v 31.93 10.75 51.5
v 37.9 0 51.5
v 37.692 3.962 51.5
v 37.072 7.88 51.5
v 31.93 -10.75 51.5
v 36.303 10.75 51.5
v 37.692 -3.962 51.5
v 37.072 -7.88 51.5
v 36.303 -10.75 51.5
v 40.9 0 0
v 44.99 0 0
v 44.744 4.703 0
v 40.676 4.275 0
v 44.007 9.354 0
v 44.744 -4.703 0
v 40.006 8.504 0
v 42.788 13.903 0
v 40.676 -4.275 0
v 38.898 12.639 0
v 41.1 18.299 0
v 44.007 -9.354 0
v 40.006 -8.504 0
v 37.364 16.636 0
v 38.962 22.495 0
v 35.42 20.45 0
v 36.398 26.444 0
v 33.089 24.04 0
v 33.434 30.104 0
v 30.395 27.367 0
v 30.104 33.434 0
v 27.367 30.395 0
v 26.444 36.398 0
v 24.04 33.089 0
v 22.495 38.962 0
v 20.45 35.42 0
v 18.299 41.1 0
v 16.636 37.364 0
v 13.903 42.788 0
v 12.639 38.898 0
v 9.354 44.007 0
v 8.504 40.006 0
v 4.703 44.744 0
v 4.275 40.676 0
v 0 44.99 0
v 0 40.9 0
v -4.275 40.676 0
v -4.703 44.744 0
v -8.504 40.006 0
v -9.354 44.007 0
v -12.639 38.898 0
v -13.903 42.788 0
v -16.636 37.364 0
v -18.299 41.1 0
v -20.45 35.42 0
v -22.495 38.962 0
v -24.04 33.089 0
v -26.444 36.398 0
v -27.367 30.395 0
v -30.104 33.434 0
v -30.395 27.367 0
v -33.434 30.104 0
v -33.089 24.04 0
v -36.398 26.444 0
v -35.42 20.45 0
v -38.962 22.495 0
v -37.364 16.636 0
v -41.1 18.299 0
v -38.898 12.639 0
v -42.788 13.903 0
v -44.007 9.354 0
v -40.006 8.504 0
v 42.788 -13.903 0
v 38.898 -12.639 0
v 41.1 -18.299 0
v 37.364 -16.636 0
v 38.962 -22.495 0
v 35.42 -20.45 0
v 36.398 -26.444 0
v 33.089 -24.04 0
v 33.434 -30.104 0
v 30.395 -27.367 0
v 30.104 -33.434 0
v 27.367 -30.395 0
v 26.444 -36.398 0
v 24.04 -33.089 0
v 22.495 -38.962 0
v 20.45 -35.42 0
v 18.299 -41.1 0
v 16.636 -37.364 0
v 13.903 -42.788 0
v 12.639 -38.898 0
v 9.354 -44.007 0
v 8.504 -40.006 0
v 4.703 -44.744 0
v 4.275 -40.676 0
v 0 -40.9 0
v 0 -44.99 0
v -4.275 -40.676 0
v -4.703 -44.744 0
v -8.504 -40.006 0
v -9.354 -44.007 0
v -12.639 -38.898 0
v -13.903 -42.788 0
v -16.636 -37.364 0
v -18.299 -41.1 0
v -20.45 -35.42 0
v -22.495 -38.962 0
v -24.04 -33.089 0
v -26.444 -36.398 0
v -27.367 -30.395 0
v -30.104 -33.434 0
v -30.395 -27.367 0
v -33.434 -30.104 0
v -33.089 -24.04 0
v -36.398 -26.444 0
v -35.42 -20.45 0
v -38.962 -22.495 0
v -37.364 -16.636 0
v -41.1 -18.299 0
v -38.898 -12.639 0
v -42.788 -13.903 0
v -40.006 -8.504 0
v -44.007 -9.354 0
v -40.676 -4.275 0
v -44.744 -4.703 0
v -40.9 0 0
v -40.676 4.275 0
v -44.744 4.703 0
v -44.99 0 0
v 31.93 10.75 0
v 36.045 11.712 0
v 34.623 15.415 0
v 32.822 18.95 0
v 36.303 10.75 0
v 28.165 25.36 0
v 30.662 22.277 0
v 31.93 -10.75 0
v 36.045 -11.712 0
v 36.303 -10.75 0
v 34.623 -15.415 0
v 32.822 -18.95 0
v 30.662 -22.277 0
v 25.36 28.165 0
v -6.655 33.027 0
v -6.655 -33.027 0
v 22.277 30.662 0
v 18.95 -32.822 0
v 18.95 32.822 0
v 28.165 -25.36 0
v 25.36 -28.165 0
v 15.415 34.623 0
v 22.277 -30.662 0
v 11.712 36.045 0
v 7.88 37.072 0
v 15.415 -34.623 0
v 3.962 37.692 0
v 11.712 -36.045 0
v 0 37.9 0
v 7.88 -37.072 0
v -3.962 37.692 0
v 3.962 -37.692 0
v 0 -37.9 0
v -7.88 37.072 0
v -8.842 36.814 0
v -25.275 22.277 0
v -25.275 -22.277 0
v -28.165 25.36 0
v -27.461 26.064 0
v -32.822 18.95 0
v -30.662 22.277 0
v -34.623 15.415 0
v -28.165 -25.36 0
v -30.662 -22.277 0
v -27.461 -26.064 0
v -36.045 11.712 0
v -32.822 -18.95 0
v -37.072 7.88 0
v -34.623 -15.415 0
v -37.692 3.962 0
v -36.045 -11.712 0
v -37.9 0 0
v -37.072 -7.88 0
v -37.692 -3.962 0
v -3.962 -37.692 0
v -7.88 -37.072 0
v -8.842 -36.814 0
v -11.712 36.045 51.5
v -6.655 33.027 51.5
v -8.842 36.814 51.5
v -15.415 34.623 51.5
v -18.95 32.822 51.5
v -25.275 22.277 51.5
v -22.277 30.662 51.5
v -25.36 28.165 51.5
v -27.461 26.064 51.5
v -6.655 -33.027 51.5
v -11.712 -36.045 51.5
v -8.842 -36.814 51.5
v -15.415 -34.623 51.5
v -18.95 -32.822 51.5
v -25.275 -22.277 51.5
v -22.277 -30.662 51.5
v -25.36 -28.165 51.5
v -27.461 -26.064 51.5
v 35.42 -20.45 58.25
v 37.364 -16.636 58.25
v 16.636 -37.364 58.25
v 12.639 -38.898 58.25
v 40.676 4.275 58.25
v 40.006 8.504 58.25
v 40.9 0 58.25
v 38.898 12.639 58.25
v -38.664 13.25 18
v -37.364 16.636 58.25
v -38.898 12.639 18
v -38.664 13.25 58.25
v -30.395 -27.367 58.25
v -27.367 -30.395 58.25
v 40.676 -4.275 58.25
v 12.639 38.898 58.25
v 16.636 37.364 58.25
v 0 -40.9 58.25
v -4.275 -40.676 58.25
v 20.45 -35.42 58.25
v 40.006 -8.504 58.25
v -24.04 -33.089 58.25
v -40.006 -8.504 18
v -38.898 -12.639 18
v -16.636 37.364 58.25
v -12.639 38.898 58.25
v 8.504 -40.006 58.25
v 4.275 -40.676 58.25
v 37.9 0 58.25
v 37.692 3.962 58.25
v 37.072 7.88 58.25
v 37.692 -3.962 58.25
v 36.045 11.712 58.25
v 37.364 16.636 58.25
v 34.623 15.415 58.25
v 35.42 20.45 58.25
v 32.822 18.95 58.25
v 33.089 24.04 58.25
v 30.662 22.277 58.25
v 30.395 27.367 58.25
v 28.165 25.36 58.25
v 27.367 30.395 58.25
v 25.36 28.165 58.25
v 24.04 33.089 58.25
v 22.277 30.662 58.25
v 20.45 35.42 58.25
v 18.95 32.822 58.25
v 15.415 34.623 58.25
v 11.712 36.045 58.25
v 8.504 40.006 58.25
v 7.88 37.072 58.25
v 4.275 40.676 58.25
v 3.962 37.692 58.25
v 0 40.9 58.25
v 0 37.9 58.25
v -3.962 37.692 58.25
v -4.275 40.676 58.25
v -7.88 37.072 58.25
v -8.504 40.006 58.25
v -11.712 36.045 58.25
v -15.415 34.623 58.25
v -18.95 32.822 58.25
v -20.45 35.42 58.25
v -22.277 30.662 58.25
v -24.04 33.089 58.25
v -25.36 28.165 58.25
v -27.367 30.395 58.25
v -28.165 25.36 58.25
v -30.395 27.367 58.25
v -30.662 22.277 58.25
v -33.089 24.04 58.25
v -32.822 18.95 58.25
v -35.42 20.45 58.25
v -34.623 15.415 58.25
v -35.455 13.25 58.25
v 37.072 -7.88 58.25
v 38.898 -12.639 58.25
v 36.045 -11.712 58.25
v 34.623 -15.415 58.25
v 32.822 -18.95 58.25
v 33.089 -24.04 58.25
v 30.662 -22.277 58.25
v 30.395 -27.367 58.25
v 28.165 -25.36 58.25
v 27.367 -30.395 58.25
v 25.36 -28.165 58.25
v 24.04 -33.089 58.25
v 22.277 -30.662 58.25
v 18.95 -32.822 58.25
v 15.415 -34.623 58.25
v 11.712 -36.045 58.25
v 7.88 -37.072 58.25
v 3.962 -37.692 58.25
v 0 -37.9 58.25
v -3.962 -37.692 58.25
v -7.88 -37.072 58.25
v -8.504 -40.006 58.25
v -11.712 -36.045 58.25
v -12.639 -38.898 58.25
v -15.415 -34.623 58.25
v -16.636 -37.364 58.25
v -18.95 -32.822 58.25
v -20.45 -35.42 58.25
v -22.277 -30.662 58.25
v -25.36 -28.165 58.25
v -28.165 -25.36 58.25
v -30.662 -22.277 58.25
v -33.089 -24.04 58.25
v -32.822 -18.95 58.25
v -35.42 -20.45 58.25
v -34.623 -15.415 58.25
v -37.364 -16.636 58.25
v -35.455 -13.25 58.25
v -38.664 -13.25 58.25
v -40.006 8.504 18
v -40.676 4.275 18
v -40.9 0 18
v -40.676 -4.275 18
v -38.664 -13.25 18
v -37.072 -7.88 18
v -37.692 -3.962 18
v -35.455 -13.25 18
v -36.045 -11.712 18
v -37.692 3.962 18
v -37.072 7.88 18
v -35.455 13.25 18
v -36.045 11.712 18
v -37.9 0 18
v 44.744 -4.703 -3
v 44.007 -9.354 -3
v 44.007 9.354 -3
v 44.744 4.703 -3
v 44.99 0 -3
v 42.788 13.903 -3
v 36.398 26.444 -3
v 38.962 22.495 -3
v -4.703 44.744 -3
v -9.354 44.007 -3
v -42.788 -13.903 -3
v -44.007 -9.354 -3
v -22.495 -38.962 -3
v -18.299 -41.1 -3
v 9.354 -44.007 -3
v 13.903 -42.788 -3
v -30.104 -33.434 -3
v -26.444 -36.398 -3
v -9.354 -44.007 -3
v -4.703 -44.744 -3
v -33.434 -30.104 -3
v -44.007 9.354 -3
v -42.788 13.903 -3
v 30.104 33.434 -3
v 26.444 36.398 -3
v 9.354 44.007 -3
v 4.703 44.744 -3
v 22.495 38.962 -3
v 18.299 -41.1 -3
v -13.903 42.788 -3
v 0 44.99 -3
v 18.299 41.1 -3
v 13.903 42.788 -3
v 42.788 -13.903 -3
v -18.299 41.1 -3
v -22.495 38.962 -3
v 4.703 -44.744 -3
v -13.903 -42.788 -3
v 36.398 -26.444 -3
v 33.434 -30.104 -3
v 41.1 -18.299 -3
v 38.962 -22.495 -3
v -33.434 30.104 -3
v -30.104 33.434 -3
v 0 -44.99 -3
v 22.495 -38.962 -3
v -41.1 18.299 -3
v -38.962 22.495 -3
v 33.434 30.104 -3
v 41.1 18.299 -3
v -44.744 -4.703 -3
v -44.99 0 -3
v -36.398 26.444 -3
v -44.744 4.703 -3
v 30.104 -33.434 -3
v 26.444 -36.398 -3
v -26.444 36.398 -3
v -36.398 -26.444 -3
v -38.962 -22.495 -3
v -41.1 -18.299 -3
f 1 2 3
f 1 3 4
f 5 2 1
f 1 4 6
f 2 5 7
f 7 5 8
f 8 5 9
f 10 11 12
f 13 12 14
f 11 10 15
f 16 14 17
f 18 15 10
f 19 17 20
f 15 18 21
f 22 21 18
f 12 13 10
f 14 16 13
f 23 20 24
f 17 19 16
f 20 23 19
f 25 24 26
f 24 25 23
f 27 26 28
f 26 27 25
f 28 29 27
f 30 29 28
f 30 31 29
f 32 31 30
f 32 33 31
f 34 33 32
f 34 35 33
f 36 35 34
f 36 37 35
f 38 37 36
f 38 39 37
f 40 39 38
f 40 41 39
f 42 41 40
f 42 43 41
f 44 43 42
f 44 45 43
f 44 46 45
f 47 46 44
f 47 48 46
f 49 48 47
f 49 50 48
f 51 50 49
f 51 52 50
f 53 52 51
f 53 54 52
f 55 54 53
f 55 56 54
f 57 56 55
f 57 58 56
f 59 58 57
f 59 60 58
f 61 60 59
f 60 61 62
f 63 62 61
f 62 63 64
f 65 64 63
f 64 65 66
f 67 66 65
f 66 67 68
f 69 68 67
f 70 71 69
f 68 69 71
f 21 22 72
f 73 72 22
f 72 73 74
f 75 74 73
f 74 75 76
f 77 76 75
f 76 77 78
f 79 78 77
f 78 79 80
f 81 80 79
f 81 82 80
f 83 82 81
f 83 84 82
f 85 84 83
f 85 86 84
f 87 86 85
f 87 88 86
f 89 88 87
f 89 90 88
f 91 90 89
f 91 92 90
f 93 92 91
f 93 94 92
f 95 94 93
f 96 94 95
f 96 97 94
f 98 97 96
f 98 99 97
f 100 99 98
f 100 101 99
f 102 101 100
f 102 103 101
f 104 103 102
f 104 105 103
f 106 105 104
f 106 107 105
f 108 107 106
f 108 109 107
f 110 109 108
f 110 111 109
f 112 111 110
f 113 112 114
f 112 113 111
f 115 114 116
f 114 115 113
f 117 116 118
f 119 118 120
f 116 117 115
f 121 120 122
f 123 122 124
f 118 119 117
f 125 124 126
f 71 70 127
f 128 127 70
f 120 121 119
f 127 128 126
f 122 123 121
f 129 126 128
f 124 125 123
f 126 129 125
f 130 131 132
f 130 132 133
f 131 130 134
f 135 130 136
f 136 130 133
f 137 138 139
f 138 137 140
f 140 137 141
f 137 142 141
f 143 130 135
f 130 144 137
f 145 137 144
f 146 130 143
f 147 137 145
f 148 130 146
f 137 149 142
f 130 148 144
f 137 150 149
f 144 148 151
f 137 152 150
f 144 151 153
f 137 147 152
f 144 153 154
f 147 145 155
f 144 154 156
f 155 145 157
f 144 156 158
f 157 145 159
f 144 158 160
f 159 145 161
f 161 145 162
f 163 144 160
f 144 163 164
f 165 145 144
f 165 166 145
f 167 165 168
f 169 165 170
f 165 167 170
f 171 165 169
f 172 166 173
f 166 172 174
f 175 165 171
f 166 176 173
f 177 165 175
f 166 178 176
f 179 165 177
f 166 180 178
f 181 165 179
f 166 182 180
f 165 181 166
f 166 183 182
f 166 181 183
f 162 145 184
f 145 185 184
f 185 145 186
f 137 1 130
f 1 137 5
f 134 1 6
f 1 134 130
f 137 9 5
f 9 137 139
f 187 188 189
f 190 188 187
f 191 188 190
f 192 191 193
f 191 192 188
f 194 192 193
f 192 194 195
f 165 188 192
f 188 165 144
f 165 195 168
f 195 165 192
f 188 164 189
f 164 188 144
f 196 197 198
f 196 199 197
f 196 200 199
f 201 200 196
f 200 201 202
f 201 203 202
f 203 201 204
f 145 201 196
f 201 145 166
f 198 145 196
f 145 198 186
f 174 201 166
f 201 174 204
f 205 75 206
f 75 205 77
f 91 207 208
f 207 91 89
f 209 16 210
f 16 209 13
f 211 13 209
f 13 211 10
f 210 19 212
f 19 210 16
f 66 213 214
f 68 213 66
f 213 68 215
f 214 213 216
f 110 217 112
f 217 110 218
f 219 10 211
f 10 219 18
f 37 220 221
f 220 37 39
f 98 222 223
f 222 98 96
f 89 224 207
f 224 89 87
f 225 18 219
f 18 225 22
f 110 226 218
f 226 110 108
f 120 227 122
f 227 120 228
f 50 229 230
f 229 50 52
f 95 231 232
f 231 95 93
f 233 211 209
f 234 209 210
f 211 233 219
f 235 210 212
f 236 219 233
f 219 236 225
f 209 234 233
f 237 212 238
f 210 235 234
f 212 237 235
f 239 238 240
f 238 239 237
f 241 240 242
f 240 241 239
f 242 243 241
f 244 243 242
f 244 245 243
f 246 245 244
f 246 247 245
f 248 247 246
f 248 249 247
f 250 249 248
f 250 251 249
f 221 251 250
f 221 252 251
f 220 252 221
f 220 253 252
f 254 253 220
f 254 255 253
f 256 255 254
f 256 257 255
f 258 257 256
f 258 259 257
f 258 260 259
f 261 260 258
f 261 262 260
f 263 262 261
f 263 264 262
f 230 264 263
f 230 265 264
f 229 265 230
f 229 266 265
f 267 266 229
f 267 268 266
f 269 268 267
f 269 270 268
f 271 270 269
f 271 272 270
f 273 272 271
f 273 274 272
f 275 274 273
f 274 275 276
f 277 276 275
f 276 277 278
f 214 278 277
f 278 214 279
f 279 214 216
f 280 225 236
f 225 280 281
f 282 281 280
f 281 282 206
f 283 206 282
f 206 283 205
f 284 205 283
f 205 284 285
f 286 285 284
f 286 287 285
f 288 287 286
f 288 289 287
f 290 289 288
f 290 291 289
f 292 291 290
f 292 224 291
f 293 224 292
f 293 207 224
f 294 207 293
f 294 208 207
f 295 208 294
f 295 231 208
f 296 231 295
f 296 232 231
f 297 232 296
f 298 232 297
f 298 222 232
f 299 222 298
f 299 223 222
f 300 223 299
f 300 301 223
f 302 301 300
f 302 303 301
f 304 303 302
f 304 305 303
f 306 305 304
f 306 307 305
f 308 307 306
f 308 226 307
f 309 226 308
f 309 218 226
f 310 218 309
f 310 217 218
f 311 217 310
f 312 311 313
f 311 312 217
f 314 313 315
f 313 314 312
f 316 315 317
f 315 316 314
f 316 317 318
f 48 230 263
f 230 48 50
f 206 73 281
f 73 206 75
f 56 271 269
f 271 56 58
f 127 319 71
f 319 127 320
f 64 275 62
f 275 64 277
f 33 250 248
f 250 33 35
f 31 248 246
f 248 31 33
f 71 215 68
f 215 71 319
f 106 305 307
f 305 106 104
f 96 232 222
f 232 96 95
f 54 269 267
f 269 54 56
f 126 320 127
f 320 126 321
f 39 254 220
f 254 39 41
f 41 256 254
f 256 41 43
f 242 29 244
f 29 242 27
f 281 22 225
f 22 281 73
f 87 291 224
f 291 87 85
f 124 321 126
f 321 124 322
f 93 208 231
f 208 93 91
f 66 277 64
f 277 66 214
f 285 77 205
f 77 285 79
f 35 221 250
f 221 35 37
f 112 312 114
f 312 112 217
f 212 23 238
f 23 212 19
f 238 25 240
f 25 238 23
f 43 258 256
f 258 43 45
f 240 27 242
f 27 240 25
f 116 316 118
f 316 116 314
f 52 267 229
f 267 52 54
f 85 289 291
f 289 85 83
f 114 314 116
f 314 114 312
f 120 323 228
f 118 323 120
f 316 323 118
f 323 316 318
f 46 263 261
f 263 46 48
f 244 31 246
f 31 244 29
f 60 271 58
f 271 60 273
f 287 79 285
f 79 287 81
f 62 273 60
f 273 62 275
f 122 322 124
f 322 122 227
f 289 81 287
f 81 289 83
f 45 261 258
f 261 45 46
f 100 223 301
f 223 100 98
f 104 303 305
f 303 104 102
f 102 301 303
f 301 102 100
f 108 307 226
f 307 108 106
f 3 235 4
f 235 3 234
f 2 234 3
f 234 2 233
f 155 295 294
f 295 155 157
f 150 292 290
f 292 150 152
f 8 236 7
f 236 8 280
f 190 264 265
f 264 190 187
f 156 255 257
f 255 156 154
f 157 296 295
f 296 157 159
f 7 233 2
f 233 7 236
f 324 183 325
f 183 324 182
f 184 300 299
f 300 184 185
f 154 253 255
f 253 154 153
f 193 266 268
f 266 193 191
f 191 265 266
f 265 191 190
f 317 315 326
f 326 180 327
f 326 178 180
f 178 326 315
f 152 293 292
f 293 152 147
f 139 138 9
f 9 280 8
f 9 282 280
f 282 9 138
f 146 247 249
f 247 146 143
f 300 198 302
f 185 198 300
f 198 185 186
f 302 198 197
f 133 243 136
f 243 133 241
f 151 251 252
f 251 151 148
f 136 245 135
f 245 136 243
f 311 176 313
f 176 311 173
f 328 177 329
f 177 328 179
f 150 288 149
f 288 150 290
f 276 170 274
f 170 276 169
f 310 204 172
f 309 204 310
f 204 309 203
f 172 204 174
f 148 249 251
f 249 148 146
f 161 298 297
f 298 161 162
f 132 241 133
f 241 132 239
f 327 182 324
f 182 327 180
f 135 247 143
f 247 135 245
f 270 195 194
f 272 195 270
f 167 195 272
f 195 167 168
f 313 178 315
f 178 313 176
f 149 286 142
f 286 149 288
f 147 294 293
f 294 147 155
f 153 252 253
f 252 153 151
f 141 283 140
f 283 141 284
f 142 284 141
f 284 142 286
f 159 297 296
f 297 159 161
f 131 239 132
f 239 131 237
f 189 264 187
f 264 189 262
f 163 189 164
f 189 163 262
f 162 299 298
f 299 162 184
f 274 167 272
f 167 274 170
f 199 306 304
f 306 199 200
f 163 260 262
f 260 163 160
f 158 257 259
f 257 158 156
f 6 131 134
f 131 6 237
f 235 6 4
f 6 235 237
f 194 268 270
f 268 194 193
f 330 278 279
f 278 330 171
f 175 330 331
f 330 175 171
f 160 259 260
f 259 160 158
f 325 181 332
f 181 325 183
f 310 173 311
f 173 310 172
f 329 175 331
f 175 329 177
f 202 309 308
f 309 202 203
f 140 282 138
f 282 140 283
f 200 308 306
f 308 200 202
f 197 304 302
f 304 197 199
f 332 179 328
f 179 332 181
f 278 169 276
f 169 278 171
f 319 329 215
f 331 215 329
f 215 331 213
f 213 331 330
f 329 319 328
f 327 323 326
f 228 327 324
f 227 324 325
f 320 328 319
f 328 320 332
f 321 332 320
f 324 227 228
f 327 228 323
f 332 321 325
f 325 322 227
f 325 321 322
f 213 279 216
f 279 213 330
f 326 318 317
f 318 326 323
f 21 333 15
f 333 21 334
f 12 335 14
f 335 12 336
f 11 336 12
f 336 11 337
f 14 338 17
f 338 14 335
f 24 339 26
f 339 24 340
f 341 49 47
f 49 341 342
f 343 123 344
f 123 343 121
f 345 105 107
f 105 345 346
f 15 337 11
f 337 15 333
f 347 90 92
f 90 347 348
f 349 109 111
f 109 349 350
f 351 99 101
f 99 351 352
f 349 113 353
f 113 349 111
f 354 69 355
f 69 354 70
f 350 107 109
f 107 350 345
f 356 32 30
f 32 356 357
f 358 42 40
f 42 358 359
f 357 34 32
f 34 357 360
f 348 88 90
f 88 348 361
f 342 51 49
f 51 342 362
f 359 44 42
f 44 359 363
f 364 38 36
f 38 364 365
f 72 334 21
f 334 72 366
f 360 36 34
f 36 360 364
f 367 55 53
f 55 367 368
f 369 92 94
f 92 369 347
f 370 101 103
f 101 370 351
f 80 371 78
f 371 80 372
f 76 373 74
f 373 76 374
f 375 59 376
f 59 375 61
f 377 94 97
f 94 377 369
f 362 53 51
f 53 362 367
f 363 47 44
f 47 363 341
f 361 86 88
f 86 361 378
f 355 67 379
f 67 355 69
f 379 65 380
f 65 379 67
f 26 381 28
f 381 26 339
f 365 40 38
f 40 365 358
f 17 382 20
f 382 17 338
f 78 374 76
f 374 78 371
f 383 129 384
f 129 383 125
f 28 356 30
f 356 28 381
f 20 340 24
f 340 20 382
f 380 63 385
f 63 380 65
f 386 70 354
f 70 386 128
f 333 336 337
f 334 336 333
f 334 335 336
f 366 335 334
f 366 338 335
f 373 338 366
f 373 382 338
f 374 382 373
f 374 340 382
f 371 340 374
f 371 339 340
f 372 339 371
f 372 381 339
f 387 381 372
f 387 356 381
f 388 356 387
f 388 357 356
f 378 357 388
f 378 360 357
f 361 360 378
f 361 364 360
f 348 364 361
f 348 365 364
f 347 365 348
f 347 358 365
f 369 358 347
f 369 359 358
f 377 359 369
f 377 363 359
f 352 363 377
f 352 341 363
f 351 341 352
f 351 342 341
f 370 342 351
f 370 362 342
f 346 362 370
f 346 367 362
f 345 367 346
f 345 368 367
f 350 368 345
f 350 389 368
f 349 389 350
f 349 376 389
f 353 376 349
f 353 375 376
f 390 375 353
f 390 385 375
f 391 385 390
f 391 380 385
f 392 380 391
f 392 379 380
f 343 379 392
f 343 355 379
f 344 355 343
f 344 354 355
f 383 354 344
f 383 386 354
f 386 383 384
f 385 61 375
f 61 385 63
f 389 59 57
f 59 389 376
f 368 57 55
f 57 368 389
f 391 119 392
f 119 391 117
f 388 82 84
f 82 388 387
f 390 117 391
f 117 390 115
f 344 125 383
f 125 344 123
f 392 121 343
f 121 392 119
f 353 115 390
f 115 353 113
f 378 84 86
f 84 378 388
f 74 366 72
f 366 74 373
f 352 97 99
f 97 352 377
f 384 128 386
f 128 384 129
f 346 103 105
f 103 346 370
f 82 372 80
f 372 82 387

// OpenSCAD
$fn = 60;

inner_diameter=62;
shell_thickness=3;
opening_width=26.5;
slot_width=21.5;
slot_height=6.75;
slot_depth=6.9;
depth=51.5;
handle_bottom_height=18;

difference(){
    union(){
        for(i = [0 : 1 : 2]){
            rotate([0,0,i*360/3]){
                translate([inner_diameter/2+(inner_diameter/2)*0.03,-21.5/2,0])
                cube([slot_depth,21.5,depth]);
            }
        }

        difference(){
            cylinder(h=depth+slot_height,r=inner_diameter/2+slot_depth+shell_thickness);
            translate([0,0,-1])cylinder(h=depth+slot_height+2,r=inner_diameter/2+slot_depth);
        }
    }

    translate([-inner_diameter,-opening_width/2,handle_bottom_height])
    cube([inner_diameter, opening_width,depth]);
}

translate([0,0,-3]) cylinder(h=3, r = 1.1*(slot_depth + shell_thickness+ inner_diameter/2));
